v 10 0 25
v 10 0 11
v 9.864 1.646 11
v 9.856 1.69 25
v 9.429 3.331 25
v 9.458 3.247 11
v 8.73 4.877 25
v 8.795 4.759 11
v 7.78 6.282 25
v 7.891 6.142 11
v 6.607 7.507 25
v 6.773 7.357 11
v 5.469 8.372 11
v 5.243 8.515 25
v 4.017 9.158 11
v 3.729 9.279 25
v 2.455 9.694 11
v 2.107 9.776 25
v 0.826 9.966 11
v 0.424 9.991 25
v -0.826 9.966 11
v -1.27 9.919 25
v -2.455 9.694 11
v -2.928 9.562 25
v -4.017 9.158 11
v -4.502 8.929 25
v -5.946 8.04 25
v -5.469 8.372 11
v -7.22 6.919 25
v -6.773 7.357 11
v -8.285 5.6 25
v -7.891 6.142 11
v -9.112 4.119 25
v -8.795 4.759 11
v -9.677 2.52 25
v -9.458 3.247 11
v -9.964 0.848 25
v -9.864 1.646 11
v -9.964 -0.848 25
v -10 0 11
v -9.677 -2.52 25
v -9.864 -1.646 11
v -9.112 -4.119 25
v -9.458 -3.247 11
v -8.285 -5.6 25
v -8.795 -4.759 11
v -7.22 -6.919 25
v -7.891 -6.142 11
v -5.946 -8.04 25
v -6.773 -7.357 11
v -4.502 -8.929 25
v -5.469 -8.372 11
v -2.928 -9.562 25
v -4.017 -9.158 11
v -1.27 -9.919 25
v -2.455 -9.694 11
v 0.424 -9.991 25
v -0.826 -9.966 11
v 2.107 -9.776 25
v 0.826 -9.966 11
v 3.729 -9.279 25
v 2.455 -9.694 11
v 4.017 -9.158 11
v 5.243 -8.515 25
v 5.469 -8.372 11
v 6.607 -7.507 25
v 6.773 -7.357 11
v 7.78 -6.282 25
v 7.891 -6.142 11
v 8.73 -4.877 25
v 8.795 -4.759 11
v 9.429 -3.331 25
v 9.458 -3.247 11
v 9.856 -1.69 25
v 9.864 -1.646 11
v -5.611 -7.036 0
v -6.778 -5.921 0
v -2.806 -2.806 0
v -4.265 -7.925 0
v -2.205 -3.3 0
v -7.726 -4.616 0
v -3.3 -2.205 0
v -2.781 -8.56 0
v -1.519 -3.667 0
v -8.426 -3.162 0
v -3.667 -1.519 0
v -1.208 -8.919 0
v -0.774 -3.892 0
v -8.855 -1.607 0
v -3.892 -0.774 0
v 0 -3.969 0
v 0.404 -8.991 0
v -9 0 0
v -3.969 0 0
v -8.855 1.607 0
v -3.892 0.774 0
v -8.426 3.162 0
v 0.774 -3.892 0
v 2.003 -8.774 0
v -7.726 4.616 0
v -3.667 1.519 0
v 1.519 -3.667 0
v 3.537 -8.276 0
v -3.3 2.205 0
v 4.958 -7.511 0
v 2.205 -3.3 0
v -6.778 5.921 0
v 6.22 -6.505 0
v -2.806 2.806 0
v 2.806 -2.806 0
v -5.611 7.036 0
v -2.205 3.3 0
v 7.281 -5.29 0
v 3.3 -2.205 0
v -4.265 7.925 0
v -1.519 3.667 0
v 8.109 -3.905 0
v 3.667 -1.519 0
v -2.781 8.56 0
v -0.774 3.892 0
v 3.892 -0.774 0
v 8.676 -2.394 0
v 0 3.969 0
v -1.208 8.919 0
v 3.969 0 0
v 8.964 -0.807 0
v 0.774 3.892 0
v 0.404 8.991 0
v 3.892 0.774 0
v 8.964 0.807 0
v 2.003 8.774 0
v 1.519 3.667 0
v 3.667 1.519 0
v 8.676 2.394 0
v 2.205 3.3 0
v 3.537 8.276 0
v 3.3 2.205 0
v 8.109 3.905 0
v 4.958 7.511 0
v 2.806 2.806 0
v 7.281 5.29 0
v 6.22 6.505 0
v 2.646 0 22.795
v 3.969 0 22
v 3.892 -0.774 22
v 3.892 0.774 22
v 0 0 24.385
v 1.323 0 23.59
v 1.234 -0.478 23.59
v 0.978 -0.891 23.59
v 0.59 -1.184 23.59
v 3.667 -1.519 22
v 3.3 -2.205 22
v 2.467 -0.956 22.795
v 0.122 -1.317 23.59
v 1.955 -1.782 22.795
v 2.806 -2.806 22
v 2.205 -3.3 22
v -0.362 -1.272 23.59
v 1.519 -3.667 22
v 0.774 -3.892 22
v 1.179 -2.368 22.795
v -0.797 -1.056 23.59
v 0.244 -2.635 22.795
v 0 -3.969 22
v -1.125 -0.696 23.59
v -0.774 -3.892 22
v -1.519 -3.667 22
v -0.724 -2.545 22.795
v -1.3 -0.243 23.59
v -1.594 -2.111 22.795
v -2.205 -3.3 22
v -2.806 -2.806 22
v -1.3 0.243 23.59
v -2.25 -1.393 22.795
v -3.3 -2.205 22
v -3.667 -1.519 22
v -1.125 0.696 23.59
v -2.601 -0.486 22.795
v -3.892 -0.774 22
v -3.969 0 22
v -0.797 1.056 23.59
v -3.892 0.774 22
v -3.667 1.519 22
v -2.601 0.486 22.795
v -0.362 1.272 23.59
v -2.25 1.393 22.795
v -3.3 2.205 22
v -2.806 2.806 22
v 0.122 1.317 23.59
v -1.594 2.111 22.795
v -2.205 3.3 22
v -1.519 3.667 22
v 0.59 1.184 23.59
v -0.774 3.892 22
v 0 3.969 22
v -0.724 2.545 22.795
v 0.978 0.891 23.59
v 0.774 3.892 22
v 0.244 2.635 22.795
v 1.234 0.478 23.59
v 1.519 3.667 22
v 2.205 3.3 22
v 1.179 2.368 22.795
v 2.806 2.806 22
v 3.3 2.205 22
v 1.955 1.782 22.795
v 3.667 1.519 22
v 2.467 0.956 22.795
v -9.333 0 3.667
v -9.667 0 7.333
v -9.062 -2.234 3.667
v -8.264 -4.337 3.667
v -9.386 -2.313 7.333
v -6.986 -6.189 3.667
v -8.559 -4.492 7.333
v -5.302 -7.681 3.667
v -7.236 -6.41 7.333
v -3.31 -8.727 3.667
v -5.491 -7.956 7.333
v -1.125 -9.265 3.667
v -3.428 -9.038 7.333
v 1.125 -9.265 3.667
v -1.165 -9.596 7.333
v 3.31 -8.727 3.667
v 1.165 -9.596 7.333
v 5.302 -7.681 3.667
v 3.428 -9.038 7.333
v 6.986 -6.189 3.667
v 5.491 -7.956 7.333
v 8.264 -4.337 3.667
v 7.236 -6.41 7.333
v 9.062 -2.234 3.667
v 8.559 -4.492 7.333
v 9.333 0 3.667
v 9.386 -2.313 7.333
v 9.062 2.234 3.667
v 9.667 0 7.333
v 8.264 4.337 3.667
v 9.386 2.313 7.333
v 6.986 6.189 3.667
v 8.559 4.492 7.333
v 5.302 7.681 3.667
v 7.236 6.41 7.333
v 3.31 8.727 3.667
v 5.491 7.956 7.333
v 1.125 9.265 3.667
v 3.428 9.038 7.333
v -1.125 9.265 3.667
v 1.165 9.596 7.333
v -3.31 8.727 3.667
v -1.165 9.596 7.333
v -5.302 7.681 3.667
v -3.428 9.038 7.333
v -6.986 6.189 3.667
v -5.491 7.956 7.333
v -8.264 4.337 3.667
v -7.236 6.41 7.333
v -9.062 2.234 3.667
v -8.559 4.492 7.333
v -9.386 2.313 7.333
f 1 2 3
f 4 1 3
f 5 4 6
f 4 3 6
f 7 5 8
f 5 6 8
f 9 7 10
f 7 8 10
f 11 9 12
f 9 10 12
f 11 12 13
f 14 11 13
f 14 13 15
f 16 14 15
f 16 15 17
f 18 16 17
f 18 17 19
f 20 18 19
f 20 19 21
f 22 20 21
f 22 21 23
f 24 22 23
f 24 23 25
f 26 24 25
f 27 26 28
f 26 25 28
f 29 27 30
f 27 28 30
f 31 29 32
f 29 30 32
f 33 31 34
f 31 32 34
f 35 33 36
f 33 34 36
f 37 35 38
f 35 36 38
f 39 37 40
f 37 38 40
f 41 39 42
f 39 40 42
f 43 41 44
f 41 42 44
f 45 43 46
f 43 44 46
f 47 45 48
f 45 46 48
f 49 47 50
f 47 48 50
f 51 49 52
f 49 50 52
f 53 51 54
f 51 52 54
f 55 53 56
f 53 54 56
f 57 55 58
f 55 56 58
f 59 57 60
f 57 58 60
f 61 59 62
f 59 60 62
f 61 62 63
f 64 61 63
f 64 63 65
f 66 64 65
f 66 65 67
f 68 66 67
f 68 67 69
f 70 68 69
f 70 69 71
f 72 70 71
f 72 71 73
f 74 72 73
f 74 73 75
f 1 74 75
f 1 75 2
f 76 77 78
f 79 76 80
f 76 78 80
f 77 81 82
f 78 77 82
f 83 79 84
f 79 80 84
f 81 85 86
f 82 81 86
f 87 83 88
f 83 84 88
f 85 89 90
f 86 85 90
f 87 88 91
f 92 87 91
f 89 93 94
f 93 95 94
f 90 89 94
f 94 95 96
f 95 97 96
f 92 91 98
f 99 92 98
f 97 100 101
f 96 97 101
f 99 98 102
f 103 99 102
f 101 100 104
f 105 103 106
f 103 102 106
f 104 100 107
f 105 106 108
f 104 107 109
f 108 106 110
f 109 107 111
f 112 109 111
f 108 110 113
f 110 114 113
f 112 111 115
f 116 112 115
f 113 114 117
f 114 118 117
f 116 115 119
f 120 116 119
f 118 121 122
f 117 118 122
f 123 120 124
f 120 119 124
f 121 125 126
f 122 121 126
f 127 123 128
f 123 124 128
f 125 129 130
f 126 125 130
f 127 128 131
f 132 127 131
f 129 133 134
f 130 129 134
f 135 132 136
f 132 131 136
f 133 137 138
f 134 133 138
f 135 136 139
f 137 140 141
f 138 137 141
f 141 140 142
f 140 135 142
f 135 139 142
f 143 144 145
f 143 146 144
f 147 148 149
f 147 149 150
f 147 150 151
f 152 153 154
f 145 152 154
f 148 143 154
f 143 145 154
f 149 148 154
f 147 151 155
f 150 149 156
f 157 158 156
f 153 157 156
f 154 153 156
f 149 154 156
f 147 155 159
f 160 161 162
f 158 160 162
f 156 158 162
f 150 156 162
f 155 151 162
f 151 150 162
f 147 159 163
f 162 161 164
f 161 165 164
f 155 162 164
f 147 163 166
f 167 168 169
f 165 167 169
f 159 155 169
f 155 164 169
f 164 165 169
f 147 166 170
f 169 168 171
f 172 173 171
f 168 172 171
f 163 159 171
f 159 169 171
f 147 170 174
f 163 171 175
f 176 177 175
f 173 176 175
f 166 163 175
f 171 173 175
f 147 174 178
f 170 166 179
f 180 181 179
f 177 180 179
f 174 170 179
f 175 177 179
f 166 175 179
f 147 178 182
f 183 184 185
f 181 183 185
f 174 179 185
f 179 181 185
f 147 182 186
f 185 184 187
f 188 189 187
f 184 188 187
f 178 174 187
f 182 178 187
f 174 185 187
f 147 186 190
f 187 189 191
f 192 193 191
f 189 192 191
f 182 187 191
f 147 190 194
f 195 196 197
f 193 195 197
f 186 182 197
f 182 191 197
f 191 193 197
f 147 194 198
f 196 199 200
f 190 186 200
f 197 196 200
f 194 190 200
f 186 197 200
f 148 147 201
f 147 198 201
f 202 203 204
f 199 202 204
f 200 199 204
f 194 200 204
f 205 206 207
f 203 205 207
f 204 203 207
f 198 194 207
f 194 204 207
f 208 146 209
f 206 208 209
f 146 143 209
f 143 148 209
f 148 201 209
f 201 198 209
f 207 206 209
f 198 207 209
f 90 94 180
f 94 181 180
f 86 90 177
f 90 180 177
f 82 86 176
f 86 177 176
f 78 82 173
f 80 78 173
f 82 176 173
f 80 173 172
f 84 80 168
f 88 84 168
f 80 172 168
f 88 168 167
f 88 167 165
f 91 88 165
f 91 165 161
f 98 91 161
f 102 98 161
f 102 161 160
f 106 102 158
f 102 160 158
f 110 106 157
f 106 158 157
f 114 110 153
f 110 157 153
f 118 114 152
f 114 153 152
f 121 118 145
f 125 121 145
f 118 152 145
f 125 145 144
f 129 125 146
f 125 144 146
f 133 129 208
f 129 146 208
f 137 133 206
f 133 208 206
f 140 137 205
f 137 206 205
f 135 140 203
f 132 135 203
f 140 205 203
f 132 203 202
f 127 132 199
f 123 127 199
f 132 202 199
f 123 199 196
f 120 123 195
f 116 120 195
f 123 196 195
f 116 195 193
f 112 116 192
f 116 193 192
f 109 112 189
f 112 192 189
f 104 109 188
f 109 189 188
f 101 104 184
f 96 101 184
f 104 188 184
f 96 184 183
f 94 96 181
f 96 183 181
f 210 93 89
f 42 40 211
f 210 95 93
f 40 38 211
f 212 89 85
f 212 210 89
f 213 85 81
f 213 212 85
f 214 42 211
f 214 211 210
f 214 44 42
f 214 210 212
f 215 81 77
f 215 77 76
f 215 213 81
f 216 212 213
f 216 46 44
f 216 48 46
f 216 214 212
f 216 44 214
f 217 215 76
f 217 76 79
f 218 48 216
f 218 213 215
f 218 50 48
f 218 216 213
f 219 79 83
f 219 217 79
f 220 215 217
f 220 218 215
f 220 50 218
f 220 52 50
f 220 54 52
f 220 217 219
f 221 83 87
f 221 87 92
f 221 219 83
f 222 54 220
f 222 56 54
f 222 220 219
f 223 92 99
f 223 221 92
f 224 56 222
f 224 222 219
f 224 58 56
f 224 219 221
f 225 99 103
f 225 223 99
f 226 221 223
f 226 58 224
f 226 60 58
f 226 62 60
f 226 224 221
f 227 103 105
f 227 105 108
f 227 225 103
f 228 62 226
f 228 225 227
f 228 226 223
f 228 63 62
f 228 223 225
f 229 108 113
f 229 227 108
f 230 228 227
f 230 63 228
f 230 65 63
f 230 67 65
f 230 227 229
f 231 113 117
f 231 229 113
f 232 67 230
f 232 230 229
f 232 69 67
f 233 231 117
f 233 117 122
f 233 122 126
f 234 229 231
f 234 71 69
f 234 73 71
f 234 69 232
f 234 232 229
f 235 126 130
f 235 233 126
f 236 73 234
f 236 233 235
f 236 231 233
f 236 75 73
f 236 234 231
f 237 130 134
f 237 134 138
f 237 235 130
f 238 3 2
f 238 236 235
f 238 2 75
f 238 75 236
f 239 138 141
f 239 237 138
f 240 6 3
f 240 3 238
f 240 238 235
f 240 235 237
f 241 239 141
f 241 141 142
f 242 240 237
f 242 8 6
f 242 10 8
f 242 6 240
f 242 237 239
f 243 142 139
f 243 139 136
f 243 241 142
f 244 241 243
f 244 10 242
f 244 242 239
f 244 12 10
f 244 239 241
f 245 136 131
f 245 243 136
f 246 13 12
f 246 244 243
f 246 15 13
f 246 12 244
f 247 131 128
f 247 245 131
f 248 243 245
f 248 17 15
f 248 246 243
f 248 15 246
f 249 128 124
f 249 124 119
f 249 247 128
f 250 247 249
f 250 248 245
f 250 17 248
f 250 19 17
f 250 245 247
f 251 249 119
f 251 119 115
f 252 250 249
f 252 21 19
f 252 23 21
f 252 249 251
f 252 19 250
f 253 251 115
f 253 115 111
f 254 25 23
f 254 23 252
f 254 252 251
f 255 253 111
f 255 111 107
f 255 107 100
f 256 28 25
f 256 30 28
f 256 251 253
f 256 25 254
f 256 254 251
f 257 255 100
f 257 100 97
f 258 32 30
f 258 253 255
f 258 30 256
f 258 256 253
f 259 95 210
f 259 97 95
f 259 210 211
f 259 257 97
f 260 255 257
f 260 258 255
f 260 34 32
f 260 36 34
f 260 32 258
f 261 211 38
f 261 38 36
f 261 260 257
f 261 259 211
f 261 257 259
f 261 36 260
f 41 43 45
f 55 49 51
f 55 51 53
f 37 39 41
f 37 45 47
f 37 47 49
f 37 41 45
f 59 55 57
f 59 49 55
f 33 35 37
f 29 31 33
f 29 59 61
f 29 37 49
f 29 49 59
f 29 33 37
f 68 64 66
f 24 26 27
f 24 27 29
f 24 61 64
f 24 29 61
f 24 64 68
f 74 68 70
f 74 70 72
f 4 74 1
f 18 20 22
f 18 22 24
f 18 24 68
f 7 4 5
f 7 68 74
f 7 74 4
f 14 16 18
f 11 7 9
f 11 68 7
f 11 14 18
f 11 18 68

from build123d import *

# Parameters (mm, degrees)
F0_R     = 10
F1_DEPTH = 25
F2_D     = 7.9375
F2_DEPTH = 22
F2_TIP   = 2.3846655818


with BuildPart() as f1:
    # F0 (on Top) → F1 (new body)
    with BuildSketch(Plane.XY):
        Circle(F0_R)
    extrude(amount=F1_DEPTH)

    # F2
    with Locations(Plane(origin=(0, 0, 0), x_dir=(1, 0, 0), z_dir=(0, 0, -1))):
        with Locations((0, 0)):
            Hole(F2_D / 2, depth=F2_DEPTH)
            with Locations((0, 0, -(F2_DEPTH + F2_TIP / 2))):  # 118° drill point
                Cone(0, F2_D / 2, F2_TIP, mode=Mode.SUBTRACT)

    # F3 (on Front) → F4 (revolve, cut)
    with BuildSketch(Plane.XZ):
        Polygon((-10, 11), (-10, 0), (-9, 0), align=None)
    revolve(axis=Axis((0, 0, 5.5), (0, 0, 1)), mode=Mode.SUBTRACT)


solid = f1.part
